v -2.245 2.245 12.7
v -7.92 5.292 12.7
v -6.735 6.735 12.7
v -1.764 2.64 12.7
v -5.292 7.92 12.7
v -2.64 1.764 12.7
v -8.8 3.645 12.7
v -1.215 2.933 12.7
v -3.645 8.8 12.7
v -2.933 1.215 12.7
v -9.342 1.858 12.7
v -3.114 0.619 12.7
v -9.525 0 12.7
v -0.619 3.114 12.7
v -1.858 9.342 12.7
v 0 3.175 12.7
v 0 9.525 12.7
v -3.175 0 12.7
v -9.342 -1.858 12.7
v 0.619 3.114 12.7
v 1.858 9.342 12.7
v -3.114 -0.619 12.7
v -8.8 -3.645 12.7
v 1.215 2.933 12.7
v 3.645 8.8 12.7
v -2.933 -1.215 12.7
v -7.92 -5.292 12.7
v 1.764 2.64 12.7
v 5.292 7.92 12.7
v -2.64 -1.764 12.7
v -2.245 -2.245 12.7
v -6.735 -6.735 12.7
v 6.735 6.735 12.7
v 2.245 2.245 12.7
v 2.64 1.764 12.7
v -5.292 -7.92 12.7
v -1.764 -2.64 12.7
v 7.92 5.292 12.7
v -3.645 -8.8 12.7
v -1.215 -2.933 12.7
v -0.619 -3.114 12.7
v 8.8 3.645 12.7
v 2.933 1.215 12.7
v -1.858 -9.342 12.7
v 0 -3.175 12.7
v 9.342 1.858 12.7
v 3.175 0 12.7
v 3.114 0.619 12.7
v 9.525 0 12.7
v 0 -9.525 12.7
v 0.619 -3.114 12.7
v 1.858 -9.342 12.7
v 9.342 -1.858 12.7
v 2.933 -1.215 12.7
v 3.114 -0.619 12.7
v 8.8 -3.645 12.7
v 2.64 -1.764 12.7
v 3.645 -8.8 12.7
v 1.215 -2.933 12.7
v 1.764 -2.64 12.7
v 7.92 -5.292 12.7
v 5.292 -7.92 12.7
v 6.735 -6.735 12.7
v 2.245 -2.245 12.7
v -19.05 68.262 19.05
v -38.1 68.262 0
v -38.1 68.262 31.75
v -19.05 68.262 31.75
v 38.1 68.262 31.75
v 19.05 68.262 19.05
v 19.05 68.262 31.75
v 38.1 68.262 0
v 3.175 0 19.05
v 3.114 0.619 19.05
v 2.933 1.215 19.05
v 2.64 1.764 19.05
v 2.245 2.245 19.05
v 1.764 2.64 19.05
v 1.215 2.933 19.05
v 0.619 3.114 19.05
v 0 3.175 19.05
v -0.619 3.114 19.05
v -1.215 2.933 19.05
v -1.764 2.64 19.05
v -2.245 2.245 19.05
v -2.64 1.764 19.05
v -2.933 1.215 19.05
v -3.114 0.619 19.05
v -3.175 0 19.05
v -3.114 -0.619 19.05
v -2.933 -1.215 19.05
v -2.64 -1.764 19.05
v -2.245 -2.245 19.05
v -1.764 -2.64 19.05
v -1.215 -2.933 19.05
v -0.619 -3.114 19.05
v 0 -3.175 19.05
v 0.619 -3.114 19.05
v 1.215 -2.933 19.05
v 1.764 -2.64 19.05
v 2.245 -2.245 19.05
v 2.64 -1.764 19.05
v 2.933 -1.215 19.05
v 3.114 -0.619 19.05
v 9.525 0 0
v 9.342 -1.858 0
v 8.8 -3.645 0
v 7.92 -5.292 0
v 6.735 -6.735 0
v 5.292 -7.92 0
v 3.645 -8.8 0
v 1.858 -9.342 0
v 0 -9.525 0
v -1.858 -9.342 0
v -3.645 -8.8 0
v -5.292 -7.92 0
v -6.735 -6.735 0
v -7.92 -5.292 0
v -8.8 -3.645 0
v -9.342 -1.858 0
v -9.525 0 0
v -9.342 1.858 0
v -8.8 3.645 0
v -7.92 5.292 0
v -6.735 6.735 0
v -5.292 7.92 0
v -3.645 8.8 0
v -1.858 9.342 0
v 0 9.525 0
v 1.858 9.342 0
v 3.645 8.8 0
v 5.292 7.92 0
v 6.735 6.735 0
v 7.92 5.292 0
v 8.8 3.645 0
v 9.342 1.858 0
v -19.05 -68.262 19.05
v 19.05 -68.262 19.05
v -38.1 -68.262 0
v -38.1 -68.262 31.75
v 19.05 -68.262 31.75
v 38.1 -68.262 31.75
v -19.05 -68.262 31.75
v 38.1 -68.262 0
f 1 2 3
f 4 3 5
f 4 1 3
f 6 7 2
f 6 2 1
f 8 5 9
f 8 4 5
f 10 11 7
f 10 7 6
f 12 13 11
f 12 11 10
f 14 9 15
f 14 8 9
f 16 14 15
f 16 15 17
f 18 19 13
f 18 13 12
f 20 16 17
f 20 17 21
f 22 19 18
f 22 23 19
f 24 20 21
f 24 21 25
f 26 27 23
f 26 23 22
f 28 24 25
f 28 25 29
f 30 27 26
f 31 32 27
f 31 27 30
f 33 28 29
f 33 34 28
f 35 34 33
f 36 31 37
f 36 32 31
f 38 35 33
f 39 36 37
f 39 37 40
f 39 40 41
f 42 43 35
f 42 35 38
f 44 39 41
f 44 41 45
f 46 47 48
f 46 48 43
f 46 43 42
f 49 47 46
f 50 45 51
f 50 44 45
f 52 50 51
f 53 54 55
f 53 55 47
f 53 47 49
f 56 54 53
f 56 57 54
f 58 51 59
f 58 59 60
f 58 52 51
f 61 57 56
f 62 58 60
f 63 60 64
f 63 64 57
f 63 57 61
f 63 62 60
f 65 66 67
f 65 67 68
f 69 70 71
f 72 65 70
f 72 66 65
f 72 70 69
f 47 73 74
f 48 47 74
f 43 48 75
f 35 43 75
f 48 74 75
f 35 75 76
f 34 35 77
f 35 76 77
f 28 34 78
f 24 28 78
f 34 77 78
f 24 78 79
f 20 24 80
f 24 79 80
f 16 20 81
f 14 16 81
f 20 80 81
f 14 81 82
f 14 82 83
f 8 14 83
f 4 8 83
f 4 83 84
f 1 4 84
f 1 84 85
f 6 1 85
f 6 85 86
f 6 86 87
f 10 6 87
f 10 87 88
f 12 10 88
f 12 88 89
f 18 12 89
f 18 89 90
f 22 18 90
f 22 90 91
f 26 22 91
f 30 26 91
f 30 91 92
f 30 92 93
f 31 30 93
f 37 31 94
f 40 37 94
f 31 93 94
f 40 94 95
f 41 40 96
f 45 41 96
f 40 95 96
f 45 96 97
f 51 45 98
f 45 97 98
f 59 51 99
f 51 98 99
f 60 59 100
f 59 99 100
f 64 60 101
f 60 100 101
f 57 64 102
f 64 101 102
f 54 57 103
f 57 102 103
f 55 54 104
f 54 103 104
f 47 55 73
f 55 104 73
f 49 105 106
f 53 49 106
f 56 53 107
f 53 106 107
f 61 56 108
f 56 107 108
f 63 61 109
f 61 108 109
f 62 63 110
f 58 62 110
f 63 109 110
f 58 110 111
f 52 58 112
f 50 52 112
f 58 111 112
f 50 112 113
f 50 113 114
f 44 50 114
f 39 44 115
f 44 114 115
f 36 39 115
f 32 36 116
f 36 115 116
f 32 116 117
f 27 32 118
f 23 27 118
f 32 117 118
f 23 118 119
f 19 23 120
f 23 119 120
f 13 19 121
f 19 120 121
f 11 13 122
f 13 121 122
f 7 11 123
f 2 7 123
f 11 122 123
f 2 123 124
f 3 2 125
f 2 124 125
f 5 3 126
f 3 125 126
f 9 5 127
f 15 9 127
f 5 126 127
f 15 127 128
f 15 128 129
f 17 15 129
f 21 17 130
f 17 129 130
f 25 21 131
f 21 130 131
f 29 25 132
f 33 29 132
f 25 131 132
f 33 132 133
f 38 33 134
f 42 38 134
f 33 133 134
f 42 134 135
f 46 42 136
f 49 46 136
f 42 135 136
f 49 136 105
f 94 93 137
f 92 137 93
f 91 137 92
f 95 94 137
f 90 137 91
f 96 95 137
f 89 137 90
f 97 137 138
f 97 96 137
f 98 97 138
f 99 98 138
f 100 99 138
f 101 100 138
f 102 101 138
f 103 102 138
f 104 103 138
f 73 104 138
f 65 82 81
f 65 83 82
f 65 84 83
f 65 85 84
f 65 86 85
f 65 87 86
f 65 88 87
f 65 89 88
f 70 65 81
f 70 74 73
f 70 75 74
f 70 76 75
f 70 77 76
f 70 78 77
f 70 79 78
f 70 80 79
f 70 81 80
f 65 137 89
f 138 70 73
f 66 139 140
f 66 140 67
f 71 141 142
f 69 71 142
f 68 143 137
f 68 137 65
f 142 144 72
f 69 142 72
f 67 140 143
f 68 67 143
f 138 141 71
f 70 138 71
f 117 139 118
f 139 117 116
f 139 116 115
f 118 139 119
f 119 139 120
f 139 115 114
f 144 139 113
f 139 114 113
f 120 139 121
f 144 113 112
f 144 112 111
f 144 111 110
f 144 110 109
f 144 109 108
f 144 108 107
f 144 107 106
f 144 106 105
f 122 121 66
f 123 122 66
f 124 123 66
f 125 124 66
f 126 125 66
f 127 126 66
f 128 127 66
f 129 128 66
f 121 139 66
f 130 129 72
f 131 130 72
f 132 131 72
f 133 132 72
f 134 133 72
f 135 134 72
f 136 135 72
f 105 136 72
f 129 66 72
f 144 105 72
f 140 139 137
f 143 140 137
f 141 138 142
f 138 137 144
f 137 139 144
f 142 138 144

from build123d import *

# Parameters (mm, degrees)
F0_W     = 76.2
F0_H     = 136.525
F1_DEPTH = 31.75
F2_W     = 38.1
F2_H     = 136.525
F3_DEPTH = 12.7
F5_R     = 9.525
F6_DEPTH = 12.7
F4_R     = 3.175
F7_DEPTH = 254


with BuildPart() as f1:
    # F0 (on Top) → F1 (new body)
    with BuildSketch(Plane.XY):
        Rectangle(F0_W, F0_H)
    extrude(amount=F1_DEPTH)

    # F2 (on face) → F3 (cut)
    with BuildSketch(Plane.XY.offset(31.75)):
        Rectangle(F2_W, F2_H)
    extrude(amount=-F3_DEPTH, mode=Mode.SUBTRACT)

    # F5 (on face) → F6 (cut)
    with BuildSketch(Plane(origin=(0, 0, 0), x_dir=(1, 0, 0), z_dir=(0, 0, -1))):
        Circle(F5_R)
    extrude(amount=-F6_DEPTH, mode=Mode.SUBTRACT)

    # F4 (on face) → F7 (cut)
    with BuildSketch(Plane.XY.offset(19.05)):
        Circle(F4_R)
    extrude(amount=-F7_DEPTH, mode=Mode.SUBTRACT)


solid = f1.part
